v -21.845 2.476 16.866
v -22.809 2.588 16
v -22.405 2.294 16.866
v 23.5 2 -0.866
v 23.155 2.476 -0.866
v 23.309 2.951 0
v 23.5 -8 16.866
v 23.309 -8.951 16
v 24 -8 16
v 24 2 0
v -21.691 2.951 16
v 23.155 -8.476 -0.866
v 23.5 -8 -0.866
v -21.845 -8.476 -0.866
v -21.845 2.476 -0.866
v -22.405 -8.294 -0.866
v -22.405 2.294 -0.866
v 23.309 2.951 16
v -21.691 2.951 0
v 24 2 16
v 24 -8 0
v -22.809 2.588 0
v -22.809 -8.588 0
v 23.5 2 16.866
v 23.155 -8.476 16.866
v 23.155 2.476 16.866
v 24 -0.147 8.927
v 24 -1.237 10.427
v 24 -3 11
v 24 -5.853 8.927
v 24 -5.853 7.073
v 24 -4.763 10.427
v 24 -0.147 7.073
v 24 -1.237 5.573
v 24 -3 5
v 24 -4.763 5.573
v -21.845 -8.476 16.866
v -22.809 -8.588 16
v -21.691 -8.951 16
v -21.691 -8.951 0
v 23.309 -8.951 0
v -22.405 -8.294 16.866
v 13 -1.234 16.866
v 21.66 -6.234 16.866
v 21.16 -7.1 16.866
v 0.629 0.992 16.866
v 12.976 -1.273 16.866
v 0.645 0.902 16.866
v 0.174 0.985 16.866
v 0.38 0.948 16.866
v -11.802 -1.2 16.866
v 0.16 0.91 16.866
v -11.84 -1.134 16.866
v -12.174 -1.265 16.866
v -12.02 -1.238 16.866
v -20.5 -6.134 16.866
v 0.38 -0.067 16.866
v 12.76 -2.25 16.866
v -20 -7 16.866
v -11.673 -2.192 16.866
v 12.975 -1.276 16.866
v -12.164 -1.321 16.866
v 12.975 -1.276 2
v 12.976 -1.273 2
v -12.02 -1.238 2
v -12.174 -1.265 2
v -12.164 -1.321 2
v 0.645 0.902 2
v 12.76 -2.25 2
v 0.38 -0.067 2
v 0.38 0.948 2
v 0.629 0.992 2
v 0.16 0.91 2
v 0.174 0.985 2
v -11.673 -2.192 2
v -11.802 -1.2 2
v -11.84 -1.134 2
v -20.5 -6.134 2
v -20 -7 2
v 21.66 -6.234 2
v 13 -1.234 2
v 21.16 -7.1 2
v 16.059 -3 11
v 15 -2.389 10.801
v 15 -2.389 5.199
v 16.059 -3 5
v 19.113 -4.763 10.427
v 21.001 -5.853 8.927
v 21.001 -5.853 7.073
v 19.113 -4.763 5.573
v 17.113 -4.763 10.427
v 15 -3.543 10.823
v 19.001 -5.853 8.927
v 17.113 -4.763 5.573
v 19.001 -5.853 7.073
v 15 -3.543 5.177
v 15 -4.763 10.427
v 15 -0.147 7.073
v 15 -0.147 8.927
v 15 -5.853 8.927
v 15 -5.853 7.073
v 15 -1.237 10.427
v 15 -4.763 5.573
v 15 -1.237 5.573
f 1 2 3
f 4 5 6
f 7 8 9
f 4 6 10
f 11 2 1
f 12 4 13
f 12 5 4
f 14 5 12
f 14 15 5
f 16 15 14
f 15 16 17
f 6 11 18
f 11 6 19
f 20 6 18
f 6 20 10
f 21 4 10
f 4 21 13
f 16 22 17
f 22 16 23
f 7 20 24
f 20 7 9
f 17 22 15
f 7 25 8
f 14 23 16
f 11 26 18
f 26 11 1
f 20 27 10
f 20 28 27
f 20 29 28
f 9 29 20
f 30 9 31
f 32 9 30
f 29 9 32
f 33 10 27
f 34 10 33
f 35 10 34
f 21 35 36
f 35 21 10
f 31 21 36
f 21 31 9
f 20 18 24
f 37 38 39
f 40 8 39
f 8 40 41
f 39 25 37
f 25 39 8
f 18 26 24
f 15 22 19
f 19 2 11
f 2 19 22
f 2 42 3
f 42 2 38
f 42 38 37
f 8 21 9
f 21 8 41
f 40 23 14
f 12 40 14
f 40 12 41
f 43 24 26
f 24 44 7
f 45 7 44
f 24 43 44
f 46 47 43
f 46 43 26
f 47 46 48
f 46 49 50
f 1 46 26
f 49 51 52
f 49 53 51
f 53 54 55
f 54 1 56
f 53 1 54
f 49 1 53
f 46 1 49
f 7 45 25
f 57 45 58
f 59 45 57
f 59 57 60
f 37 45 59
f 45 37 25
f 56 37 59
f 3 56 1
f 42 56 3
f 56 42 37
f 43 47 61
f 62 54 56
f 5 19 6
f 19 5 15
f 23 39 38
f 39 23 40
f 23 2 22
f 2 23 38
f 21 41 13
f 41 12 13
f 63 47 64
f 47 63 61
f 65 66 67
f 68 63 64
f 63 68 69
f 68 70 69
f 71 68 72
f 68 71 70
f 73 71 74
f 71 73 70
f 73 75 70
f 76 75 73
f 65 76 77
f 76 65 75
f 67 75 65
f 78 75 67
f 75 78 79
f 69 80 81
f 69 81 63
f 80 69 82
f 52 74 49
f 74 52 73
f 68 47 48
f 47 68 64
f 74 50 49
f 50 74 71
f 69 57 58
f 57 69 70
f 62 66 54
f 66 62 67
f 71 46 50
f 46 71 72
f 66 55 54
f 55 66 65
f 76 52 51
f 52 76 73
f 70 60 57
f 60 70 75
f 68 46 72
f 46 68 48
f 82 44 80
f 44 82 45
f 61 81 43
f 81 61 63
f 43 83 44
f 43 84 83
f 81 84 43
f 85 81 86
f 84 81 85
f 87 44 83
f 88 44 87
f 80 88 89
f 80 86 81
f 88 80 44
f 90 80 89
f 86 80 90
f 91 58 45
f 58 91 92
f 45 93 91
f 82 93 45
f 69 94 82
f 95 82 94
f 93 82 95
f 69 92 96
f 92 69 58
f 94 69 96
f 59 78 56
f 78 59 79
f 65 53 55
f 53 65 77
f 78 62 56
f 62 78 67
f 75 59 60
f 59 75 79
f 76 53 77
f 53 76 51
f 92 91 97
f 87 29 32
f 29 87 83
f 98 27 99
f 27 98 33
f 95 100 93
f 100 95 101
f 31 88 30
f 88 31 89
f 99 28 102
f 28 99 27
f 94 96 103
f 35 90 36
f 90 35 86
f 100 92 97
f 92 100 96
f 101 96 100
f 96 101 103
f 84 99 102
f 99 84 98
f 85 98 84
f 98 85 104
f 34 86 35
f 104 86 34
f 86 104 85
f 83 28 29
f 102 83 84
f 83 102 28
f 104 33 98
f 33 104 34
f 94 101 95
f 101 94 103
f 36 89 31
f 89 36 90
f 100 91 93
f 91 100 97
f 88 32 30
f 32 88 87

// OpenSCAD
difference() {
    minkowski() {
        translate([-22, -8, 0])
        cube([45, 10, 16]);
        sphere(1);
    }

    // Middle Top
    translate([0, 0, 2])
    rotate([0, 0, -10])
    cube([13, 1, 16]);

    translate([-12, -2.25, 2])
    rotate([0, 0, 10])
    cube([13, 1, 16]);

    // Outter top
    translate([12.5, -2.1, 2])
    rotate([0, 0, -30])
    cube([10, 1, 16]);

    translate([-20, -7, 2])
    rotate([0, 0, 30])
    cube([10, 1, 16]);
    
    translate([15, -3, 8])
    rotate([0, 90, 0])
    cylinder(h=10,r=3);
}
